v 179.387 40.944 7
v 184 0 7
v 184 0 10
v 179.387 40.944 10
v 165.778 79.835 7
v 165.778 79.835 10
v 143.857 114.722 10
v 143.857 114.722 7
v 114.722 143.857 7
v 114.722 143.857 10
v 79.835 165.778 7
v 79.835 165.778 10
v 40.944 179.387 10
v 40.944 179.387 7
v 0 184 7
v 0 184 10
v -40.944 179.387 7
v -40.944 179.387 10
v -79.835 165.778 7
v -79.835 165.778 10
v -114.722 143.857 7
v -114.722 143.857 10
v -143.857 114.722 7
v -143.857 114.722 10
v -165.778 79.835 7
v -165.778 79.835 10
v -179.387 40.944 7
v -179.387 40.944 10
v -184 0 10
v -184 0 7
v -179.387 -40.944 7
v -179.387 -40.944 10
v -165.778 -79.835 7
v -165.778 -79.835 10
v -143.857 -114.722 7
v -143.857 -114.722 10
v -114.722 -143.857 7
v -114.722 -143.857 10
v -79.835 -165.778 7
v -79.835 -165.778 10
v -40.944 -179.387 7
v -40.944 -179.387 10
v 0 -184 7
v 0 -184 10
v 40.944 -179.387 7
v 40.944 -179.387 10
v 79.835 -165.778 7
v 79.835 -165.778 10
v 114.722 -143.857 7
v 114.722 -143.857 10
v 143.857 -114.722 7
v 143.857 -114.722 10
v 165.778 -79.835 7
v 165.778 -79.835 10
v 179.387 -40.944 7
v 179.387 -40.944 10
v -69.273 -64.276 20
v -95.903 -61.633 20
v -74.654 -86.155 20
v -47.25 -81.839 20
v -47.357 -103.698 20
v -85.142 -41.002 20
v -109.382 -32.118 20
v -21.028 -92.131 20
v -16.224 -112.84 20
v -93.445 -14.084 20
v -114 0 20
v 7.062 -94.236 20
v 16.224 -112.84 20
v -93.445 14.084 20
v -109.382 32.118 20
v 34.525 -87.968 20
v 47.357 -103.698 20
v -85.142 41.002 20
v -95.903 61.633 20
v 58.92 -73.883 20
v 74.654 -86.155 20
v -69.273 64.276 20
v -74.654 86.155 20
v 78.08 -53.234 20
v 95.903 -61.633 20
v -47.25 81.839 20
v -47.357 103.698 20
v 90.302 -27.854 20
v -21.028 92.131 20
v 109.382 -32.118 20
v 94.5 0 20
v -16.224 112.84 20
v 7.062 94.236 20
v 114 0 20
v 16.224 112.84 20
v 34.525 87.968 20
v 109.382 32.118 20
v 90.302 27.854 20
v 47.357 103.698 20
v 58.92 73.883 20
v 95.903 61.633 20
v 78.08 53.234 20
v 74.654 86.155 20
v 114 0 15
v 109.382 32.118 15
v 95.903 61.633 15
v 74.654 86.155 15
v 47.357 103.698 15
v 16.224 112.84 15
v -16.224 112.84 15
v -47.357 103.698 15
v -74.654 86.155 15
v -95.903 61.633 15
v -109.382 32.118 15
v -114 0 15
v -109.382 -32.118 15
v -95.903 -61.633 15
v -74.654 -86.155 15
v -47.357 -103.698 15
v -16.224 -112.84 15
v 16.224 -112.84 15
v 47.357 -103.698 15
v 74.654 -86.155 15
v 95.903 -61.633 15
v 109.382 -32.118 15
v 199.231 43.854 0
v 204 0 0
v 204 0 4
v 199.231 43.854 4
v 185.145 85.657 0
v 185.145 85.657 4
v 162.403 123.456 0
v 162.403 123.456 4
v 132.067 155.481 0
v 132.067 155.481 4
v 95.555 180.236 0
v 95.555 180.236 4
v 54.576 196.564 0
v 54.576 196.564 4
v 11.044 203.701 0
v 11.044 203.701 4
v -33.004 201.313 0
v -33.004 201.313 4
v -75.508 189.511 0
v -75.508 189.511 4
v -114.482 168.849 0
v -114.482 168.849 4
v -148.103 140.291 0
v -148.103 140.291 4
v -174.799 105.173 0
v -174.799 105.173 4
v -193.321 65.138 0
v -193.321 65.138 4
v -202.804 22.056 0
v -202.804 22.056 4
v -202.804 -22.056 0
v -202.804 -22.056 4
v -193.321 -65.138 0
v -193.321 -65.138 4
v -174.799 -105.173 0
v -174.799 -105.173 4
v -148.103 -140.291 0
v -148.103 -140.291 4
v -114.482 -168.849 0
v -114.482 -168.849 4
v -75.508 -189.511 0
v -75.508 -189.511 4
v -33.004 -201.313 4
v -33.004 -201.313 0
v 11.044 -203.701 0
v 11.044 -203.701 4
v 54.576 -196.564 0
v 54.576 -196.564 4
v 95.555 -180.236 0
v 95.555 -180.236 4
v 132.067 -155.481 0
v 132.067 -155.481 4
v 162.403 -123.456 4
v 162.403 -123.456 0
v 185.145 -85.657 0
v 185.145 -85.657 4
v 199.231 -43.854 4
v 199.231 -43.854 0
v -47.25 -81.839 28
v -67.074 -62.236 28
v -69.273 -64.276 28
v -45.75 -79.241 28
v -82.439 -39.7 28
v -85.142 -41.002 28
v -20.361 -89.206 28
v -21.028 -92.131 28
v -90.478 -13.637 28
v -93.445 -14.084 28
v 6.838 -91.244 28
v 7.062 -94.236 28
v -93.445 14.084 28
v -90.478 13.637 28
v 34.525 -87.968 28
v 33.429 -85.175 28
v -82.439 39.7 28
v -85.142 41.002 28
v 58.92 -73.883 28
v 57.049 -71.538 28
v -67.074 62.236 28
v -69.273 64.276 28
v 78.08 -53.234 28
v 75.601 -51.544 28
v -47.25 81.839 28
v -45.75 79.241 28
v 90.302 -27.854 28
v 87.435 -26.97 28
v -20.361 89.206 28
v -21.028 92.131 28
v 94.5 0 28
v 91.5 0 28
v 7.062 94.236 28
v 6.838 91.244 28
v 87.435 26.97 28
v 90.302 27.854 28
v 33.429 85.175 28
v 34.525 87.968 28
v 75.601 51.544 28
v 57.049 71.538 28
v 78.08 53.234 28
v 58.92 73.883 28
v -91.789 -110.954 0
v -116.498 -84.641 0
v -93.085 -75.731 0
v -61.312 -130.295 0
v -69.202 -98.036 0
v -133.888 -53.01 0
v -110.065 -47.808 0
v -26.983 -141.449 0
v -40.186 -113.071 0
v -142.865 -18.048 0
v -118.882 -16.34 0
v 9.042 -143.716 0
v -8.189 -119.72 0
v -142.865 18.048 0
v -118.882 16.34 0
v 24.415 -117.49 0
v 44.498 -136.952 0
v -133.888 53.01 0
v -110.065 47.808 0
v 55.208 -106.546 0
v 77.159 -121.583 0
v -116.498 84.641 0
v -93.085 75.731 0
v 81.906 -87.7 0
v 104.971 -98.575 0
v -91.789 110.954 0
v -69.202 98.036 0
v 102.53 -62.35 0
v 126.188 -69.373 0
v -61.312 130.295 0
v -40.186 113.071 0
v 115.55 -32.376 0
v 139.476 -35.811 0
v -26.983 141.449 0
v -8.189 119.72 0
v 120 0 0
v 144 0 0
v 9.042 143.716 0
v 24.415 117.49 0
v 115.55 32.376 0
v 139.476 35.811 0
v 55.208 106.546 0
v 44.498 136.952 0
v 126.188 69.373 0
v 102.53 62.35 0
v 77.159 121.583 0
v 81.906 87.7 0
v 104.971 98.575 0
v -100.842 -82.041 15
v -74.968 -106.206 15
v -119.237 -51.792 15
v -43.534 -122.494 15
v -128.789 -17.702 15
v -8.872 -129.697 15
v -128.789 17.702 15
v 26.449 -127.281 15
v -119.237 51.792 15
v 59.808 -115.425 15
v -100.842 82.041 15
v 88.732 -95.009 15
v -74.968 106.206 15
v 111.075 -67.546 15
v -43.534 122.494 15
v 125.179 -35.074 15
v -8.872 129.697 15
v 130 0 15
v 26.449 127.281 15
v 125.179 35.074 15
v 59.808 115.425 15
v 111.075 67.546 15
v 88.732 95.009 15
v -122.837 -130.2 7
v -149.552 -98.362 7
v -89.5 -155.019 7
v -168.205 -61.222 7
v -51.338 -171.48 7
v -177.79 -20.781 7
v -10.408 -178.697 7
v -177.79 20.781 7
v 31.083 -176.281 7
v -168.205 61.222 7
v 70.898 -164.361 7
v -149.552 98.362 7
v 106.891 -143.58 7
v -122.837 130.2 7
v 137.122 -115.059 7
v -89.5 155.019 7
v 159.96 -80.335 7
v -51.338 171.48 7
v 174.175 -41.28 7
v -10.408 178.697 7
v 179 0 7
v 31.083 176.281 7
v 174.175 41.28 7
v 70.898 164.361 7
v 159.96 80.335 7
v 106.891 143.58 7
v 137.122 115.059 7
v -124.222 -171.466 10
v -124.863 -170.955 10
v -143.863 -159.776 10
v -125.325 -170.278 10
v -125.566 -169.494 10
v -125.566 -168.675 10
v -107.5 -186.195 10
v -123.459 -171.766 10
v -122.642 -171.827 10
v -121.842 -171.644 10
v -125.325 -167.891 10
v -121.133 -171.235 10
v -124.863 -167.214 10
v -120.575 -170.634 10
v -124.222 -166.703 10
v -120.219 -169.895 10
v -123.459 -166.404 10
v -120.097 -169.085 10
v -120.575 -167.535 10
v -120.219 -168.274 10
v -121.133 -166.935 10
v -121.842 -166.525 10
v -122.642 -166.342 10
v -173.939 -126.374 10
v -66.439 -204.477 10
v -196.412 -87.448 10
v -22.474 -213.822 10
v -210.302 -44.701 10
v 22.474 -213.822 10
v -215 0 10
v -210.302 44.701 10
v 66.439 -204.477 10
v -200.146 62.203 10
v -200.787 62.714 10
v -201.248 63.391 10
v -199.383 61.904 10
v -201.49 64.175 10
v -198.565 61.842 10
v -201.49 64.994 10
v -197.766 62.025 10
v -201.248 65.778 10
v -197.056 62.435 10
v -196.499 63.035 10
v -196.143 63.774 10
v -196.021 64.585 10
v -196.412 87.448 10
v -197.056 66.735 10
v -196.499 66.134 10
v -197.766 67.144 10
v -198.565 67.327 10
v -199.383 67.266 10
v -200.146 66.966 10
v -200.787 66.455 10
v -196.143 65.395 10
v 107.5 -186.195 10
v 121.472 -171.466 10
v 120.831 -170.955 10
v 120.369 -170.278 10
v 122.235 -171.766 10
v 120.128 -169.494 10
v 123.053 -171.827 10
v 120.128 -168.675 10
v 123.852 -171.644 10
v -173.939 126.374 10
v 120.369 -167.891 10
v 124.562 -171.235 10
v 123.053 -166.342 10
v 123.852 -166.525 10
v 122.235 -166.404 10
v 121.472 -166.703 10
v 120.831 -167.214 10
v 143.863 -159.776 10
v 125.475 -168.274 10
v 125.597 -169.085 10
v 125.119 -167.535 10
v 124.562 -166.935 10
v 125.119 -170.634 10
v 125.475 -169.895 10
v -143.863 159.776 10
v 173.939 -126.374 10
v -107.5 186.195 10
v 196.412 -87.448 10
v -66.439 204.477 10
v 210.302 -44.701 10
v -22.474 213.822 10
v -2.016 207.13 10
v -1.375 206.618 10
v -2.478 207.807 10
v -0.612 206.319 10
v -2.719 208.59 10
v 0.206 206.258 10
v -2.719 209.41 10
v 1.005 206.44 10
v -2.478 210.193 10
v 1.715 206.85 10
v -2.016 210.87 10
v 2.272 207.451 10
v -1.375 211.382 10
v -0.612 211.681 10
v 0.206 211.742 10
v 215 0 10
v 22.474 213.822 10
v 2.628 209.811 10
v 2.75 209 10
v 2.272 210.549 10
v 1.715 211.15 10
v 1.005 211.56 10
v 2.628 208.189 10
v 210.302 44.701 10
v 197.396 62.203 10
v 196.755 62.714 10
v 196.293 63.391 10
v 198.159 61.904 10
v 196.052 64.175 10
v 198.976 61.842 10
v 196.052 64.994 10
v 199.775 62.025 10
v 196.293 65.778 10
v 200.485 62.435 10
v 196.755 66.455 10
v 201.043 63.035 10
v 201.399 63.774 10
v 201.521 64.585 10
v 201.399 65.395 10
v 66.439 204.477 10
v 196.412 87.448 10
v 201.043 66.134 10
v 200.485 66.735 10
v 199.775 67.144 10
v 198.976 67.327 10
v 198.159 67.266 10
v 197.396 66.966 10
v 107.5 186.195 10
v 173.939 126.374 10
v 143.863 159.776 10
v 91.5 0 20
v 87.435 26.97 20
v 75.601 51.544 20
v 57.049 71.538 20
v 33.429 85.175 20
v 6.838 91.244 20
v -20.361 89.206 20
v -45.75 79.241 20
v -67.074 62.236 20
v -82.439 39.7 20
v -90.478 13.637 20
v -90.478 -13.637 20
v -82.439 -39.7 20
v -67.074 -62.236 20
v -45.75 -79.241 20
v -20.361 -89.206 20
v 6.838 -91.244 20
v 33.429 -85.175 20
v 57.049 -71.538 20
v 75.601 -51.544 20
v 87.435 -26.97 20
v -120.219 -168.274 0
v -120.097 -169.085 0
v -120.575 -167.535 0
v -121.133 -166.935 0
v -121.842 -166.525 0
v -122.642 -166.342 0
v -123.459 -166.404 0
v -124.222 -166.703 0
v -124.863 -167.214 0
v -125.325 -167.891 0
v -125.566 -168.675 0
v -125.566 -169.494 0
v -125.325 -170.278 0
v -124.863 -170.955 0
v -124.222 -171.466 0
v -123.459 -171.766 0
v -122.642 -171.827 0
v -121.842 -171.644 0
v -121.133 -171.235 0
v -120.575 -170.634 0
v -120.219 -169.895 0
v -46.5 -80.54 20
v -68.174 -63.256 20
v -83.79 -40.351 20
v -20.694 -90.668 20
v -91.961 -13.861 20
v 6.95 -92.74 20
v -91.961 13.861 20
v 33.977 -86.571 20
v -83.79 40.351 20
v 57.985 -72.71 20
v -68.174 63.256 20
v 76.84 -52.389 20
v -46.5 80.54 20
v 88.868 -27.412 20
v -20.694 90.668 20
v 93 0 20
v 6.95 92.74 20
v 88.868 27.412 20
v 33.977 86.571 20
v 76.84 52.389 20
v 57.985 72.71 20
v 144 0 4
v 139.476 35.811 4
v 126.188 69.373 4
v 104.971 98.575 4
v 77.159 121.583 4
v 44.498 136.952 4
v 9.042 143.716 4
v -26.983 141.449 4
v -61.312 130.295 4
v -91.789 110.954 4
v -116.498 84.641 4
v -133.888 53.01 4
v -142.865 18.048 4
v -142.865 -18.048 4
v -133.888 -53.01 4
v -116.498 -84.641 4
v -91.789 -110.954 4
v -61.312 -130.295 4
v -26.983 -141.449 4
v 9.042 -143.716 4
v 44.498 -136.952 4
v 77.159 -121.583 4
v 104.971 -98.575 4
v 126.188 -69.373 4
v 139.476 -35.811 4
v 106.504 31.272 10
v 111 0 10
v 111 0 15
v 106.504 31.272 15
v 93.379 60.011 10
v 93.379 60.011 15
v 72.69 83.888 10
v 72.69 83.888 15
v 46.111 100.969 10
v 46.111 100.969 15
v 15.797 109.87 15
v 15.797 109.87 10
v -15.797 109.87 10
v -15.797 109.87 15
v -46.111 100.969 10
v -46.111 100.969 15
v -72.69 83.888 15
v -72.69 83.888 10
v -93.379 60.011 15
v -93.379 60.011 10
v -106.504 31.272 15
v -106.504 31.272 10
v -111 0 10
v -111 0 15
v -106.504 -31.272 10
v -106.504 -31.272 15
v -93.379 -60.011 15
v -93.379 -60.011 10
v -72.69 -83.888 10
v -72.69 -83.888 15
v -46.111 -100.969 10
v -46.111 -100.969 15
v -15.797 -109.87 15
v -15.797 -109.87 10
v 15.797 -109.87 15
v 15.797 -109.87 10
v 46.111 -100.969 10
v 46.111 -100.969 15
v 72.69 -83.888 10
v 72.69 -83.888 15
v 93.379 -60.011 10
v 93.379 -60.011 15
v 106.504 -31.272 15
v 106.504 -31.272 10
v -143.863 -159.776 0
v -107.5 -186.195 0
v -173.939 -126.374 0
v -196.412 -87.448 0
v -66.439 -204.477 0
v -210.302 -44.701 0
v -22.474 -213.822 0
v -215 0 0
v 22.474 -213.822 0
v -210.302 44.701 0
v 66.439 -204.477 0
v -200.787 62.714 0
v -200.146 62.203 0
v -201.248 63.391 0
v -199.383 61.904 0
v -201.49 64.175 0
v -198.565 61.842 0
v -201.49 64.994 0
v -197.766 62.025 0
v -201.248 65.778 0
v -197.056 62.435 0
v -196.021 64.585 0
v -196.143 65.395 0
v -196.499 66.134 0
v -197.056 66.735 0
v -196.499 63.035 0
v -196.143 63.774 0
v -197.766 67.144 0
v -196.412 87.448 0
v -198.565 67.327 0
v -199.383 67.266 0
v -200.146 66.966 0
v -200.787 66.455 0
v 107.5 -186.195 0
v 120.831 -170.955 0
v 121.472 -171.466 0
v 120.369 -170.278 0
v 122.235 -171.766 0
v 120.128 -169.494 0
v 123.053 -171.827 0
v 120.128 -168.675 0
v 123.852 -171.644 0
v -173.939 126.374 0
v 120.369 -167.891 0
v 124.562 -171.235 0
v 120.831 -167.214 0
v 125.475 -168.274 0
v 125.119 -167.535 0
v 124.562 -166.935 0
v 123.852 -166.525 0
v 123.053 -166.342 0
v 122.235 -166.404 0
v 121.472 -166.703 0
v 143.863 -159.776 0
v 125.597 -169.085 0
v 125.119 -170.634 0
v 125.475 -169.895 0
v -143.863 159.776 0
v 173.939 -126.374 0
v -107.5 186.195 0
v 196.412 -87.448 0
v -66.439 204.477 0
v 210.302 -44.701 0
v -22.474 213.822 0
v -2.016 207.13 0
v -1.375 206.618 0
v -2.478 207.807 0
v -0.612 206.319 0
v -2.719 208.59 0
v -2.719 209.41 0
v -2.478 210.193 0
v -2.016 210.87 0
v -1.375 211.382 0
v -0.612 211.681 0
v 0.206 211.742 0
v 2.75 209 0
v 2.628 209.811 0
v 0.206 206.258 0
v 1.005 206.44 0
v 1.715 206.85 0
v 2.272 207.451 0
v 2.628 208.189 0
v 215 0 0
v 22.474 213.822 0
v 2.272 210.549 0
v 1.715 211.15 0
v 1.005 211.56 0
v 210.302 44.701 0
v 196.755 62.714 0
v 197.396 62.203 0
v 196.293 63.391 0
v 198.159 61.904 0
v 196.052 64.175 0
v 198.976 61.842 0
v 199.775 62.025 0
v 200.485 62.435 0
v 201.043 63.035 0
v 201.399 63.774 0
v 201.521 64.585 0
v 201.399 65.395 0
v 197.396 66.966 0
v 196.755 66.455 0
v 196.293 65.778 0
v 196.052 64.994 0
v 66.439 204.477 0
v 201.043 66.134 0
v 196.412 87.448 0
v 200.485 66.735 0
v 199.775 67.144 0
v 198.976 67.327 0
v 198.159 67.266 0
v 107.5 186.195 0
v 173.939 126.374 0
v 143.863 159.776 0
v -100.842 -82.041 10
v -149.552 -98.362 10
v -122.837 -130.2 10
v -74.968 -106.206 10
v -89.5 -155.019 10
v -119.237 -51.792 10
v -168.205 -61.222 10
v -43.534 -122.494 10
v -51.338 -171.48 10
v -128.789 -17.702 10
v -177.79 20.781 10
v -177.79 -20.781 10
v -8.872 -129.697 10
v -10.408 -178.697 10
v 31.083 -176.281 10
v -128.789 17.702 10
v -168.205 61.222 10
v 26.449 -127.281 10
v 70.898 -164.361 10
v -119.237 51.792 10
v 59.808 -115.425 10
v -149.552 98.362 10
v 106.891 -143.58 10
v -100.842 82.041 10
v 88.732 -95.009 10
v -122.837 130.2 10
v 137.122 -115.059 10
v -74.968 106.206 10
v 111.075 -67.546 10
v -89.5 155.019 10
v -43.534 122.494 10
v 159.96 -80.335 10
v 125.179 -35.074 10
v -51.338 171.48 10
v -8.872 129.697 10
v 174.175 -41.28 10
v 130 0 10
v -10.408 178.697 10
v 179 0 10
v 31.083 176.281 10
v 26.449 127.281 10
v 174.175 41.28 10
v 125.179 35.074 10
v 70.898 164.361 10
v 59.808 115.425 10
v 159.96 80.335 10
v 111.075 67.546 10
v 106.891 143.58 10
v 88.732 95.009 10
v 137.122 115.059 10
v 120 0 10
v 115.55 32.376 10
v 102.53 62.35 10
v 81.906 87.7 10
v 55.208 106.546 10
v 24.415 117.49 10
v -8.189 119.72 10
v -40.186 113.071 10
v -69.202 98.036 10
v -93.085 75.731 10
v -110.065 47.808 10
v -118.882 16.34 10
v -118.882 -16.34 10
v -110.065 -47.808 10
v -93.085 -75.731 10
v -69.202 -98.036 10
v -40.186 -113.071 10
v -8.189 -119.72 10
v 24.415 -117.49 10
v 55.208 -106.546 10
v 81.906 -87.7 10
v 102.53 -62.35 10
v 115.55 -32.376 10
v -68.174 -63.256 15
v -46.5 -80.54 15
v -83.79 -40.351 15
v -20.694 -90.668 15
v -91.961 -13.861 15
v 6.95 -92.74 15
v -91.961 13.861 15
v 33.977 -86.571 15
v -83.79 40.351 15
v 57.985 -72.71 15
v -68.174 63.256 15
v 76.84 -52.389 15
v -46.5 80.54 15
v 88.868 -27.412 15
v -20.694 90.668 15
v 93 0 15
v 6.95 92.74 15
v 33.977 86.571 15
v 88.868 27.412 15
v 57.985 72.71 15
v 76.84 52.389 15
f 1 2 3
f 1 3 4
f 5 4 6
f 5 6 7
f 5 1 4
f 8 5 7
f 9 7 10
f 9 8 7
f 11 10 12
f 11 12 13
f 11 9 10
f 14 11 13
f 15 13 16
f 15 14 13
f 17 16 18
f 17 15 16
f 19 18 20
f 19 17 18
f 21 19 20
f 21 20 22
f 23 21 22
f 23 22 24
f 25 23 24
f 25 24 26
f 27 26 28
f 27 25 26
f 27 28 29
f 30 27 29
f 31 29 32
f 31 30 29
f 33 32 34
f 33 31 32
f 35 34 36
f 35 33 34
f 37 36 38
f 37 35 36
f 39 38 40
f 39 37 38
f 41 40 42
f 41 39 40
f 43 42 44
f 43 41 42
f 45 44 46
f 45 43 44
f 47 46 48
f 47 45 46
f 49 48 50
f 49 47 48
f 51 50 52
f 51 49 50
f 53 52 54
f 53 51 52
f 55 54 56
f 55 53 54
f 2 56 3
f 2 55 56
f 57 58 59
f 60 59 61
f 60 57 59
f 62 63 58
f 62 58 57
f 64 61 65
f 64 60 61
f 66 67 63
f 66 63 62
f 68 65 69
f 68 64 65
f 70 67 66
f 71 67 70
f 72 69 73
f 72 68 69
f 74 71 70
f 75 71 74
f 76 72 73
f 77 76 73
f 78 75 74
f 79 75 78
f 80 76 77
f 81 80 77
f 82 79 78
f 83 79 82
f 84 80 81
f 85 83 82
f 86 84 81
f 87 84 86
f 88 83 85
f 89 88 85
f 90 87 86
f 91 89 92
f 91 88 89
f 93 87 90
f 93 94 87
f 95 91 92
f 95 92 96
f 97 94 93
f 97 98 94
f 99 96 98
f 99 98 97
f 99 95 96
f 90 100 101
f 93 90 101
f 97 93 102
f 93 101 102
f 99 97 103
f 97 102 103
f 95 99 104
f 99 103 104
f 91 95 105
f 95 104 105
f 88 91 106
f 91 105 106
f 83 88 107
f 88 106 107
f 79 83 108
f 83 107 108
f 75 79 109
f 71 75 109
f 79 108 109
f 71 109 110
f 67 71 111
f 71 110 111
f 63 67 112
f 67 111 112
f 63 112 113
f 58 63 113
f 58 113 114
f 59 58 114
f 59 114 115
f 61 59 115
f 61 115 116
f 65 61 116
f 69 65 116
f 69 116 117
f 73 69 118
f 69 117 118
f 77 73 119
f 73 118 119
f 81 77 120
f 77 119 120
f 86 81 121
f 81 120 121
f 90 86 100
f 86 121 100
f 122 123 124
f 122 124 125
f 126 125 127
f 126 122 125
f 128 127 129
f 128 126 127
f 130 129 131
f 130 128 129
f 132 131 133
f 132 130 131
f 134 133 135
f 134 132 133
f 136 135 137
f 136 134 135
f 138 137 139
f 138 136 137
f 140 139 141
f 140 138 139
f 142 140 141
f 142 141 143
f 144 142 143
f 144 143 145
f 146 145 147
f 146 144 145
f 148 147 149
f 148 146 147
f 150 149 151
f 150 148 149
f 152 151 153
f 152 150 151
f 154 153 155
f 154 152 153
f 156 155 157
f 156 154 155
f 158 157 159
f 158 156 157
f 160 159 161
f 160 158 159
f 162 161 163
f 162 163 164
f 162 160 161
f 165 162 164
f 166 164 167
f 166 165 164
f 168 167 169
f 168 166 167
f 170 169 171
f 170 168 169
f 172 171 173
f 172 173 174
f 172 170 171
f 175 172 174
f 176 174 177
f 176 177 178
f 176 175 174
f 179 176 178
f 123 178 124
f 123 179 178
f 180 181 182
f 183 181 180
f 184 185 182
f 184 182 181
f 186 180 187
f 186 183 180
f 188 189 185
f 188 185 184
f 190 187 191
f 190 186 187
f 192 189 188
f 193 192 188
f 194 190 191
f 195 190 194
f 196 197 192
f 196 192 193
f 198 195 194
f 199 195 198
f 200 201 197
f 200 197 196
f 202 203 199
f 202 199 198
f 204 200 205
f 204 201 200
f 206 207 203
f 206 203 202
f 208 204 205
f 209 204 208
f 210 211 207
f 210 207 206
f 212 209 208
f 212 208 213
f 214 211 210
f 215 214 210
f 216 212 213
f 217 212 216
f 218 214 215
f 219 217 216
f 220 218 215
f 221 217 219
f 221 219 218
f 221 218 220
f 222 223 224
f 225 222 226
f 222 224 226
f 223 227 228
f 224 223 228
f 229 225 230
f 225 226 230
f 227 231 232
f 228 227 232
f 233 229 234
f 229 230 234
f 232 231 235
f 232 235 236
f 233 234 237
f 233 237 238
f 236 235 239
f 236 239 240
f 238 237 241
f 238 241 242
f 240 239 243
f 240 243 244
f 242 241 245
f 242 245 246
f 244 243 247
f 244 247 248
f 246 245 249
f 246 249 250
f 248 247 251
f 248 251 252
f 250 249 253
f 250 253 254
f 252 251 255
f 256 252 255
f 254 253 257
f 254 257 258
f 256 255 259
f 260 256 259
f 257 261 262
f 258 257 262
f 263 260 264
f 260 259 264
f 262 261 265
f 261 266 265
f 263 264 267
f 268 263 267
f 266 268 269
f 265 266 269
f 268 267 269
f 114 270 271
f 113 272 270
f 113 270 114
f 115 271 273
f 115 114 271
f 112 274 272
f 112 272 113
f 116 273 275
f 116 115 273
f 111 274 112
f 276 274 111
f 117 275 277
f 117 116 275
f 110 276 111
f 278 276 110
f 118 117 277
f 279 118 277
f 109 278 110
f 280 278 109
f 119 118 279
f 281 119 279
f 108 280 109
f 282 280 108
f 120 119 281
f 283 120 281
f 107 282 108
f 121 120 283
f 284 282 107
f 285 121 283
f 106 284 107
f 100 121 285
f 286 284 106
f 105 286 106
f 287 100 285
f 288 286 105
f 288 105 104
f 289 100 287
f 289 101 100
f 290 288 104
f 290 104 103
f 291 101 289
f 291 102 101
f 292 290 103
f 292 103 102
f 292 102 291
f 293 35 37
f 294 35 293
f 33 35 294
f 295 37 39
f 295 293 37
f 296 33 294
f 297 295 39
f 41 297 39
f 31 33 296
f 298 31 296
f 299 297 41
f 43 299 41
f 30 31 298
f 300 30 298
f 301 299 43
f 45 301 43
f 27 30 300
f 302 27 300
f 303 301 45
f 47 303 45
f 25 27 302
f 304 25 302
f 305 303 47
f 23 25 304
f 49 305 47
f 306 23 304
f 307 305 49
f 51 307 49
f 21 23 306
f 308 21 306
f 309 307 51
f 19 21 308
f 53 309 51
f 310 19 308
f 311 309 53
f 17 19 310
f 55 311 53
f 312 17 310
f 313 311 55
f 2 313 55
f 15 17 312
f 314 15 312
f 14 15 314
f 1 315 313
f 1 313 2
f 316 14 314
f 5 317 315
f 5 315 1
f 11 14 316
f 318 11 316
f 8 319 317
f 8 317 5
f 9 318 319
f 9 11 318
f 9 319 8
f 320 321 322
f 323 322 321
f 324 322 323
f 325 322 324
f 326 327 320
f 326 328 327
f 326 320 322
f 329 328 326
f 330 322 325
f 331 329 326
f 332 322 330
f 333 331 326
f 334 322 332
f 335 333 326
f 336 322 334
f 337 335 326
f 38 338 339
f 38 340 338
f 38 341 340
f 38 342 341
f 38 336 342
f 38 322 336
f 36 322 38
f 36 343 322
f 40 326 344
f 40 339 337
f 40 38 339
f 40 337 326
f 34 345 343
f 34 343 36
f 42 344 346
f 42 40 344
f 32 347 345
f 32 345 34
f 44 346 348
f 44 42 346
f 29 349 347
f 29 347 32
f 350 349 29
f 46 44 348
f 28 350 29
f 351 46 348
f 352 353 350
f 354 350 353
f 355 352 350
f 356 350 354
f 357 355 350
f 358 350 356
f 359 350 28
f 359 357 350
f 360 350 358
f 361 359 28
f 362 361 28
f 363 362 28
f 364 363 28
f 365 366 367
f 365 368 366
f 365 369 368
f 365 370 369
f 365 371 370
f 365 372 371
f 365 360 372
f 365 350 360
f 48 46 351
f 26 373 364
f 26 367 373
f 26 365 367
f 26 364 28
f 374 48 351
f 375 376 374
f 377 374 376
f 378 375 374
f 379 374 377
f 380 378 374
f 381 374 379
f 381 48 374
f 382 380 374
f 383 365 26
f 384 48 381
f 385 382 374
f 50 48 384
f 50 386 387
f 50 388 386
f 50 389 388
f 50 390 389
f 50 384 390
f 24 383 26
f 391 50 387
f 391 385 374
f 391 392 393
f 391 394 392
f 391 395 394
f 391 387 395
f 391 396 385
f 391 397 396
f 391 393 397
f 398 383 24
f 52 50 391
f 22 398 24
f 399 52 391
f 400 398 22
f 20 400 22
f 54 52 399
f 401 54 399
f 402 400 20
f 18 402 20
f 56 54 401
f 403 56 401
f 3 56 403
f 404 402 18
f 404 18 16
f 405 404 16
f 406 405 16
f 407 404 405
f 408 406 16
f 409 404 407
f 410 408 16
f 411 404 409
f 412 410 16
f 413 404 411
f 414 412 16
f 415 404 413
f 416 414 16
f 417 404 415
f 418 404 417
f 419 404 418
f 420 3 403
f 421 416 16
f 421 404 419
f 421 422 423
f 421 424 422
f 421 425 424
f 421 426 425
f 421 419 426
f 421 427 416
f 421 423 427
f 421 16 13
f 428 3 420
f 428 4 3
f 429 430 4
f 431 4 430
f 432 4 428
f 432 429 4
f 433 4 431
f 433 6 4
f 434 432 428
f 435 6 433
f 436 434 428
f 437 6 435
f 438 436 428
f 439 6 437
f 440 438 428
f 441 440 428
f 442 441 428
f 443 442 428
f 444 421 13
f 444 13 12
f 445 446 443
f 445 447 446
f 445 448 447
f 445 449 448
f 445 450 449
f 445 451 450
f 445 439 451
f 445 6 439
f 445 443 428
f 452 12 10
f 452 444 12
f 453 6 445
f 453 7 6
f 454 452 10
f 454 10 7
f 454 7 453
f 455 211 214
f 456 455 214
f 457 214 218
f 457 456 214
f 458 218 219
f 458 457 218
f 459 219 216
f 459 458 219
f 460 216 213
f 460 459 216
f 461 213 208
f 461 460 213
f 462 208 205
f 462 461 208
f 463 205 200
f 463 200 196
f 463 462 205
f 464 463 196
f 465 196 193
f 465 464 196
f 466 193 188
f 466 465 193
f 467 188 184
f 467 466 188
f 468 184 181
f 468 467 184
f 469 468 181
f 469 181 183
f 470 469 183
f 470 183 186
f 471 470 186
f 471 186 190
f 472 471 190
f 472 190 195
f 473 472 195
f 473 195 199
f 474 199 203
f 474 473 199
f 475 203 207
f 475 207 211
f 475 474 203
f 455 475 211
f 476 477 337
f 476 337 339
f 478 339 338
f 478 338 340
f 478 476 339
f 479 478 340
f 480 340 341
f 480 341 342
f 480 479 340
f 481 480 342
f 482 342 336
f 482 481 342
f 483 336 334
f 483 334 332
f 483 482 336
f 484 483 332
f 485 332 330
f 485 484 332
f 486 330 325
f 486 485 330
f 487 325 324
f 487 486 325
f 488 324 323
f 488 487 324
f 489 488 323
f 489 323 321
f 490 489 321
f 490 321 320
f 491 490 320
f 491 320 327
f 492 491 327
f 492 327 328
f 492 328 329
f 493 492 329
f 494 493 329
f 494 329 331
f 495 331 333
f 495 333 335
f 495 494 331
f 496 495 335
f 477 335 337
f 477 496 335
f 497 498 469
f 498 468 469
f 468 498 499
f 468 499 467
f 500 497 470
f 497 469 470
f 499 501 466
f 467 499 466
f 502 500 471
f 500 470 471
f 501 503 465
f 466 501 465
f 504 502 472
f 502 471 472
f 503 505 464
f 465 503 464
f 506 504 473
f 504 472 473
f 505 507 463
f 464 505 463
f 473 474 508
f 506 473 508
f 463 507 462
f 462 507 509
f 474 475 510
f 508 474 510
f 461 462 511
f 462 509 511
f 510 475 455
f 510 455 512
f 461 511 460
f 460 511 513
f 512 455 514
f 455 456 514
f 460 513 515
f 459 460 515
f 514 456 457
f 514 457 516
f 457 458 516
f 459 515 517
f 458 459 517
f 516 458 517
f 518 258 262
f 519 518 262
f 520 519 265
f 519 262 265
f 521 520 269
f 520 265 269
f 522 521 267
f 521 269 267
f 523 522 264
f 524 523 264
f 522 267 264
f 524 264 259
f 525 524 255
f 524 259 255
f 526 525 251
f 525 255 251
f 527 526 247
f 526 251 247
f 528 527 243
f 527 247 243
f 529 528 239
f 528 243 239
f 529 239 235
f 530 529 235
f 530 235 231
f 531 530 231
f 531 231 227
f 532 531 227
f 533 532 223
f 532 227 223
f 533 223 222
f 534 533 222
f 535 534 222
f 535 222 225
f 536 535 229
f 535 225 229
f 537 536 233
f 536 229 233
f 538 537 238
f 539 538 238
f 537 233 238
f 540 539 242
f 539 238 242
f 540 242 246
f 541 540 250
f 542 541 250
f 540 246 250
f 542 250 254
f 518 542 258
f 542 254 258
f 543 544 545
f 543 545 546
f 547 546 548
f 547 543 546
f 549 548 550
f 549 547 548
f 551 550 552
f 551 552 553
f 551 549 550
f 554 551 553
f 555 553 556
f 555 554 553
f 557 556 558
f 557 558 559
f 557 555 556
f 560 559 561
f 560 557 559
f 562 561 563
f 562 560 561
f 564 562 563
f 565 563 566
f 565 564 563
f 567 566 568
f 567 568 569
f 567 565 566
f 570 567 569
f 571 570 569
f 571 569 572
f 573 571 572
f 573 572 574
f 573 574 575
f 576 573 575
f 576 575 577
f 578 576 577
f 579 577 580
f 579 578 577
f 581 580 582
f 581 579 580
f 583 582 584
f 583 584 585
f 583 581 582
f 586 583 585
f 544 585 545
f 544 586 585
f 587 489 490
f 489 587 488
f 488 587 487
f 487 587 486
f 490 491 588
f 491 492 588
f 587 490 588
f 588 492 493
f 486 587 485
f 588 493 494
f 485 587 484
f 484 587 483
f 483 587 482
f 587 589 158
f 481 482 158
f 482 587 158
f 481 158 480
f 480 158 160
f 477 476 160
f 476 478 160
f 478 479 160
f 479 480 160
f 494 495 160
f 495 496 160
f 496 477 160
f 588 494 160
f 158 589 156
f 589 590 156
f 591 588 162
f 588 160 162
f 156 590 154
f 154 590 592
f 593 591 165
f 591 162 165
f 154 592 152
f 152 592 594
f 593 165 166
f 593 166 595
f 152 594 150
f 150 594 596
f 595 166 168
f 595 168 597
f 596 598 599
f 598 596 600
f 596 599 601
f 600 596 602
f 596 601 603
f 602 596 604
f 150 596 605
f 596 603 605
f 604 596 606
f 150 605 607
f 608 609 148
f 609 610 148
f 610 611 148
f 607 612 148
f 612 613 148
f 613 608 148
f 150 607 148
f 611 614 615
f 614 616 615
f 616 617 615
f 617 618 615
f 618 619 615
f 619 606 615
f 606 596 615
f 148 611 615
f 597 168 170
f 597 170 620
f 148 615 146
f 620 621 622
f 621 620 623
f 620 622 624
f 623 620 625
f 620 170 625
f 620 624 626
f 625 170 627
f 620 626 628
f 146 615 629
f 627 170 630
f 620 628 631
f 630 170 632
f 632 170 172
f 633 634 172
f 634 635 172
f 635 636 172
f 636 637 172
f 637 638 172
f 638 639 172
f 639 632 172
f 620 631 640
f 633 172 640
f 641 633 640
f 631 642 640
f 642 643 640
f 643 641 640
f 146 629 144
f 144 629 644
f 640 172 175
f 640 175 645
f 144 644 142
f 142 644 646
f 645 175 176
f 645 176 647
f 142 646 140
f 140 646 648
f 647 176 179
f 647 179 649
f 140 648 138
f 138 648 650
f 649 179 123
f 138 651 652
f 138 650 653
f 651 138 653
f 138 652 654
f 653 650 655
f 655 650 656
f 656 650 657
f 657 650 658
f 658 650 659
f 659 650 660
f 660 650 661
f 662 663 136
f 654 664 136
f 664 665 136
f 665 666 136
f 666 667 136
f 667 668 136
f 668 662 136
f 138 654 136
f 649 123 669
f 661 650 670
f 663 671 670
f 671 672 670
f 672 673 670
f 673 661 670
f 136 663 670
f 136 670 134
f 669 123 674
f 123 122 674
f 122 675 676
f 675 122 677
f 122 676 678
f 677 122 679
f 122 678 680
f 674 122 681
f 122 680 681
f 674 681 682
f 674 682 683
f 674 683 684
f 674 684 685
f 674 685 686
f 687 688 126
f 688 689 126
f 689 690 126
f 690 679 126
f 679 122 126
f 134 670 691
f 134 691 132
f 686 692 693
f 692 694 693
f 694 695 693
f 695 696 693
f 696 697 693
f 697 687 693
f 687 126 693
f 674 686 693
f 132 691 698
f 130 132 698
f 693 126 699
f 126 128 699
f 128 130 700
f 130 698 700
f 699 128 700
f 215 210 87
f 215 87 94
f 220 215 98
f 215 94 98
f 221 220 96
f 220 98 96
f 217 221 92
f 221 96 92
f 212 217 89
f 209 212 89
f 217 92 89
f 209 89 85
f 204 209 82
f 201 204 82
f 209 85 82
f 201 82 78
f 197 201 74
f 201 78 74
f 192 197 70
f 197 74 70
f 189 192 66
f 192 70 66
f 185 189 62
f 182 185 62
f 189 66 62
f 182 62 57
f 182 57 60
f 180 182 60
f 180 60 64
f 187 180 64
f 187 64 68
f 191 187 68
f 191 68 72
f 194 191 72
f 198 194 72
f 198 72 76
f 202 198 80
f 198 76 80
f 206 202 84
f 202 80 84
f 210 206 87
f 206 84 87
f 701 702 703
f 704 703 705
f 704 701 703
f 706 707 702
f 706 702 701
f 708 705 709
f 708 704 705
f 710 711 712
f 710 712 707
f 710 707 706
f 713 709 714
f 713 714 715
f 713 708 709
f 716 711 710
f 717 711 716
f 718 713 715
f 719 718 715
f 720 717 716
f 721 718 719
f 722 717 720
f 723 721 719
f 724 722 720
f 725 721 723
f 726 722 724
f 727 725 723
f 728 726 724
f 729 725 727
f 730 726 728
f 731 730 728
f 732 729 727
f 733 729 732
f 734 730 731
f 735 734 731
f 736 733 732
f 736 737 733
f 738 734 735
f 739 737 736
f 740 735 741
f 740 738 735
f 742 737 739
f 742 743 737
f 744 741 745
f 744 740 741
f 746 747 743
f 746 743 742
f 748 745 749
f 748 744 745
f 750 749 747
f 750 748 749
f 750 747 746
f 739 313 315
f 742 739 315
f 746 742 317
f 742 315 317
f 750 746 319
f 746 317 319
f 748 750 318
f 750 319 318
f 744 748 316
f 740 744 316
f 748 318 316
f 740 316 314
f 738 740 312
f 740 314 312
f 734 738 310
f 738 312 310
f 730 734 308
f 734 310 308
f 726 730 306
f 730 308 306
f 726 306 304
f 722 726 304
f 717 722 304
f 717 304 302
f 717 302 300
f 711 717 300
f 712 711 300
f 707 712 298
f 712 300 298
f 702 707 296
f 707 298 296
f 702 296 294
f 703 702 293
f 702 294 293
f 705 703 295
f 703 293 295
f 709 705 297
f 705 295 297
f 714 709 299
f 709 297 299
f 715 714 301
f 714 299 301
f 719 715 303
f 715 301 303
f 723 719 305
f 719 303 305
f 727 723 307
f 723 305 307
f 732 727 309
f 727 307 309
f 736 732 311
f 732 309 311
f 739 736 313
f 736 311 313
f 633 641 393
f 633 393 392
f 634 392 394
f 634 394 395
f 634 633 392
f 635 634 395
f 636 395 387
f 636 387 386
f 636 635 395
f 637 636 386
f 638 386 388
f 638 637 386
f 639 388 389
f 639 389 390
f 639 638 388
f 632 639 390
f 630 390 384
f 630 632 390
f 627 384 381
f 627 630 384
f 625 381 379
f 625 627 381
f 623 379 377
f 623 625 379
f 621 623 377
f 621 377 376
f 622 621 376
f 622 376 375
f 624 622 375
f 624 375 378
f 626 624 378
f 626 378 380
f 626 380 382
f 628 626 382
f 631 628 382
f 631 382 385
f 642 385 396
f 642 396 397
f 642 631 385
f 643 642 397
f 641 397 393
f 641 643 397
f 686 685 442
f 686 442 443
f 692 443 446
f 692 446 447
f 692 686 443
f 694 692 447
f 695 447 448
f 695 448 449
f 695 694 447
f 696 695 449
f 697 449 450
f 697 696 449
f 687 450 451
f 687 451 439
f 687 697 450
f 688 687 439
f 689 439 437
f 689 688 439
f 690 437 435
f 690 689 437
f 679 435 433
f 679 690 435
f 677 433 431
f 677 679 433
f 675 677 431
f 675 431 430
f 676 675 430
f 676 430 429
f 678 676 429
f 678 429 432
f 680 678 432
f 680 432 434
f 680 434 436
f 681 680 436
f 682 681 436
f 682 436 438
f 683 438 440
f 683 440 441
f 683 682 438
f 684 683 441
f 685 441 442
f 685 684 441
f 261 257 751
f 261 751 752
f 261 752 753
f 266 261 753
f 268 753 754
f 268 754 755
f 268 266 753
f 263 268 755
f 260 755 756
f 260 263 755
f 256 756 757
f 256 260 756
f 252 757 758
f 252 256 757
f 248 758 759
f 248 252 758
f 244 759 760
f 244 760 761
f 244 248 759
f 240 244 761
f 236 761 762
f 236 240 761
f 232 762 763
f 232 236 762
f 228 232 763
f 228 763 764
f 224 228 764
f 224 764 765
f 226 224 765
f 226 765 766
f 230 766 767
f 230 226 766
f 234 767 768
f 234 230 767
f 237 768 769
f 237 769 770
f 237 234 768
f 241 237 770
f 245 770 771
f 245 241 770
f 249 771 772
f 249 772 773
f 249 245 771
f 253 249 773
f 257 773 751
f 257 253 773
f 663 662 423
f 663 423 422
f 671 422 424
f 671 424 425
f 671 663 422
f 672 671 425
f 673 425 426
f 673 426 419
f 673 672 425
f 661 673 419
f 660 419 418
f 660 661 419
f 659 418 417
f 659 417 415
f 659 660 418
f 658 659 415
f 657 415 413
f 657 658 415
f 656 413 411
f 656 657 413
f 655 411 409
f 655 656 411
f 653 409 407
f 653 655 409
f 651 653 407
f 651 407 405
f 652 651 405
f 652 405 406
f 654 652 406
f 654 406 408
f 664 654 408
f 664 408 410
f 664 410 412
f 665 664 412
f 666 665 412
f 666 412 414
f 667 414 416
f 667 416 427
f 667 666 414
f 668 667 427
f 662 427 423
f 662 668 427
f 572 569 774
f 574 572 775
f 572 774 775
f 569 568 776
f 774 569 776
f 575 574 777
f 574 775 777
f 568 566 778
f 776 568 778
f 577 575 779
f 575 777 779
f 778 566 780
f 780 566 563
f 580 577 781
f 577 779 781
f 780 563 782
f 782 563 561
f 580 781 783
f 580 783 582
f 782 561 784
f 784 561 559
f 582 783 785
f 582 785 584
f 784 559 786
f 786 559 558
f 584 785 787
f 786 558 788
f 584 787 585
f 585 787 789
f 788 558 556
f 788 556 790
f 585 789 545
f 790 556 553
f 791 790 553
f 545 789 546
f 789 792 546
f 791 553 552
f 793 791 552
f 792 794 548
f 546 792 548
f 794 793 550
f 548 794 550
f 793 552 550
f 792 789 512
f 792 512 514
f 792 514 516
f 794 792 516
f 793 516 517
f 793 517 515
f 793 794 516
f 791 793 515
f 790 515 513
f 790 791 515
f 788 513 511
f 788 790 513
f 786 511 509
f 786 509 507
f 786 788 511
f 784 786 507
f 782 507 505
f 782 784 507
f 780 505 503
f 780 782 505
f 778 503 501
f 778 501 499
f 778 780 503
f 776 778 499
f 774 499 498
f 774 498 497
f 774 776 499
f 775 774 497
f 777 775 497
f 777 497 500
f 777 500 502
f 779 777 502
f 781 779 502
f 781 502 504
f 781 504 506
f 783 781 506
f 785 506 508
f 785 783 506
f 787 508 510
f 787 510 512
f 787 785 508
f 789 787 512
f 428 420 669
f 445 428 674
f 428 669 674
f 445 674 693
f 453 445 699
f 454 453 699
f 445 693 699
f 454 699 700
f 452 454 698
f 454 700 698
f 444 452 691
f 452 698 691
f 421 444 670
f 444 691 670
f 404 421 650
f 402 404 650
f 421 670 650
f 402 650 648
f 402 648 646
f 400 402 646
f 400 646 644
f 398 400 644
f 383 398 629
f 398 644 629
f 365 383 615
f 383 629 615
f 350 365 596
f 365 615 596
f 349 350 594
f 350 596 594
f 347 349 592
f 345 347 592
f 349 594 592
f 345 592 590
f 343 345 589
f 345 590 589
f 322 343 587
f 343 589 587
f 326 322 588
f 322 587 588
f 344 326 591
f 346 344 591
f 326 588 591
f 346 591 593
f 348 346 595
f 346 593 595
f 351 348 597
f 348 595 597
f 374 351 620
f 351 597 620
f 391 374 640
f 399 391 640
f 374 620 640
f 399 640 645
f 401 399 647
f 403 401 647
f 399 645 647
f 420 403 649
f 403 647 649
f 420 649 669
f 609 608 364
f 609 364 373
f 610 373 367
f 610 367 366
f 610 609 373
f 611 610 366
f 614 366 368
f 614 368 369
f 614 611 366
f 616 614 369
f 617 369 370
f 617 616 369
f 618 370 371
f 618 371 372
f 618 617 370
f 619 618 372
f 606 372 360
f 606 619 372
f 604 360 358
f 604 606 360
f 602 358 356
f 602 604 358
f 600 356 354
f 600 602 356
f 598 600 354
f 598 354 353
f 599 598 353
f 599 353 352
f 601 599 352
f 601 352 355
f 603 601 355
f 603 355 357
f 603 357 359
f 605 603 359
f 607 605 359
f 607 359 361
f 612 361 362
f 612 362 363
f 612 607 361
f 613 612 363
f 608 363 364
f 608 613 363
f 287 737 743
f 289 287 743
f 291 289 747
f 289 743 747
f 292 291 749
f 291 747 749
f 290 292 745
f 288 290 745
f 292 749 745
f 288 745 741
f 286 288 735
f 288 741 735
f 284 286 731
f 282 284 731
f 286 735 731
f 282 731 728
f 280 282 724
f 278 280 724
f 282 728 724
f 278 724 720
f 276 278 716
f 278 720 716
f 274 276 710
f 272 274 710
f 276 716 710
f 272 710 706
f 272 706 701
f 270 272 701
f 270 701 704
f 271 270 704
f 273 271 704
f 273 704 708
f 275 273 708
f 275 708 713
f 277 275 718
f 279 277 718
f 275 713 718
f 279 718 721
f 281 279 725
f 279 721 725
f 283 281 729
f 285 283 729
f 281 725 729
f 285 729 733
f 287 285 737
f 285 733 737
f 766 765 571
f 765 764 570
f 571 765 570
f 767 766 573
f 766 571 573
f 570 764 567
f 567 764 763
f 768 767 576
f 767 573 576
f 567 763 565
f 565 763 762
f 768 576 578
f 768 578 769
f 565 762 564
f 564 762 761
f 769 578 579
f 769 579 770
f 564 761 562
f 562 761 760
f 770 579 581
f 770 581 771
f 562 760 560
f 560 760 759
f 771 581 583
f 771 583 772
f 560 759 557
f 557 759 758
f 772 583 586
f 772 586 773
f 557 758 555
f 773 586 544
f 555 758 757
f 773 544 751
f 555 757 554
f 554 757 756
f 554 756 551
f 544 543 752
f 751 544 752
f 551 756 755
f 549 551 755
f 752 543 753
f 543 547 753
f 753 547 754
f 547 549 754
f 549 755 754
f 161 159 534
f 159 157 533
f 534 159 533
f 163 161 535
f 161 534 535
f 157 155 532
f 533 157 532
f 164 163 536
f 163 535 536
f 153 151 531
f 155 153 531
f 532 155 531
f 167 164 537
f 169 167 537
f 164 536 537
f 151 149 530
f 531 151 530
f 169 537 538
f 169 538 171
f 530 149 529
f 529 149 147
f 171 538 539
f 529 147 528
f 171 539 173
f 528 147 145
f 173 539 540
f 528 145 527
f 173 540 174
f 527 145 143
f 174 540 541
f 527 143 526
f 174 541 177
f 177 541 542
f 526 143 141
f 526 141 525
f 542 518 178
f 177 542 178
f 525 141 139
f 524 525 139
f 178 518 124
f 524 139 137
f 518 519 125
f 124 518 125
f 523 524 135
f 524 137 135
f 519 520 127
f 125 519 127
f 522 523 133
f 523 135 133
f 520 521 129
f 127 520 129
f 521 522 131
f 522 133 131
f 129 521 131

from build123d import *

# Parameters (mm, degrees)
SKETCH1_R         = 215
SKETCH1_R_2       = 120
PLATE_DEPTH       = 10
SKETCH2_R         = 130
SKETCH2_R_2       = 111
BELLMOUTH1_DEPTH  = 5
SKETCH3_R         = 114
SKETCH3_R_2       = 93
BELLMOUTH2_DEPTH  = 5
SKETCH4_R         = 94.5
SKETCH4_R_2       = 91.5
BELLMOUTH3_DEPTH  = 8
SKETCH5_R         = 204
SKETCH5_R_2       = 144
COMB_GROOVE_DEPTH = 4
SKETCH6_R         = 184
SKETCH6_R_2       = 179
BAND_SEAT_DEPTH   = 3
SKETCH7_R         = 2.75
ROD_HOLES_DEPTH   = 10


with BuildPart() as part:
    # Sketch1 → Plate (new body)
    with BuildSketch(Plane.XY):
        Circle(SKETCH1_R)
        Circle(SKETCH1_R_2, mode=Mode.SUBTRACT)
    extrude(amount=PLATE_DEPTH)

    # Sketch2 → Bellmouth1 (add)
    with BuildSketch(Plane.XY.offset(10)):
        Circle(SKETCH2_R)
        Circle(SKETCH2_R_2, mode=Mode.SUBTRACT)
    extrude(amount=BELLMOUTH1_DEPTH)

    # Sketch3 → Bellmouth2 (add)
    with BuildSketch(Plane.XY.offset(15)):
        Circle(SKETCH3_R)
        Circle(SKETCH3_R_2, mode=Mode.SUBTRACT)
    extrude(amount=BELLMOUTH2_DEPTH)

    # Sketch4 → Bellmouth3 (add)
    with BuildSketch(Plane.XY.offset(20)):
        Circle(SKETCH4_R)
        Circle(SKETCH4_R_2, mode=Mode.SUBTRACT)
    extrude(amount=BELLMOUTH3_DEPTH)

    # Sketch5 → Comb_groove (cut)
    with BuildSketch(Plane.XY):
        Circle(SKETCH5_R)
        Circle(SKETCH5_R_2, mode=Mode.SUBTRACT)
    extrude(amount=COMB_GROOVE_DEPTH, mode=Mode.SUBTRACT)

    # Sketch6 → Band_seat (cut)
    with BuildSketch(Plane.XY.offset(7)):
        Circle(SKETCH6_R)
        Circle(SKETCH6_R_2, mode=Mode.SUBTRACT)
    extrude(amount=BAND_SEAT_DEPTH, mode=Mode.SUBTRACT)

    # Sketch7 → Rod_holes (cut)
    with BuildSketch(Plane.XY):
        with Locations((198.770811906, 64.584551824)):
            Circle(SKETCH7_R)
        with Locations((0, 209)):
            Circle(SKETCH7_R)
        with Locations((-198.770811906, 64.584551824)):
            Circle(SKETCH7_R)
        with Locations((-122.847117729, -169.084551824)):
            Circle(SKETCH7_R)
        with Locations((122.847117729, -169.084551824)):
            Circle(SKETCH7_R)
    extrude(amount=ROD_HOLES_DEPTH, mode=Mode.SUBTRACT)


solid = part.part
